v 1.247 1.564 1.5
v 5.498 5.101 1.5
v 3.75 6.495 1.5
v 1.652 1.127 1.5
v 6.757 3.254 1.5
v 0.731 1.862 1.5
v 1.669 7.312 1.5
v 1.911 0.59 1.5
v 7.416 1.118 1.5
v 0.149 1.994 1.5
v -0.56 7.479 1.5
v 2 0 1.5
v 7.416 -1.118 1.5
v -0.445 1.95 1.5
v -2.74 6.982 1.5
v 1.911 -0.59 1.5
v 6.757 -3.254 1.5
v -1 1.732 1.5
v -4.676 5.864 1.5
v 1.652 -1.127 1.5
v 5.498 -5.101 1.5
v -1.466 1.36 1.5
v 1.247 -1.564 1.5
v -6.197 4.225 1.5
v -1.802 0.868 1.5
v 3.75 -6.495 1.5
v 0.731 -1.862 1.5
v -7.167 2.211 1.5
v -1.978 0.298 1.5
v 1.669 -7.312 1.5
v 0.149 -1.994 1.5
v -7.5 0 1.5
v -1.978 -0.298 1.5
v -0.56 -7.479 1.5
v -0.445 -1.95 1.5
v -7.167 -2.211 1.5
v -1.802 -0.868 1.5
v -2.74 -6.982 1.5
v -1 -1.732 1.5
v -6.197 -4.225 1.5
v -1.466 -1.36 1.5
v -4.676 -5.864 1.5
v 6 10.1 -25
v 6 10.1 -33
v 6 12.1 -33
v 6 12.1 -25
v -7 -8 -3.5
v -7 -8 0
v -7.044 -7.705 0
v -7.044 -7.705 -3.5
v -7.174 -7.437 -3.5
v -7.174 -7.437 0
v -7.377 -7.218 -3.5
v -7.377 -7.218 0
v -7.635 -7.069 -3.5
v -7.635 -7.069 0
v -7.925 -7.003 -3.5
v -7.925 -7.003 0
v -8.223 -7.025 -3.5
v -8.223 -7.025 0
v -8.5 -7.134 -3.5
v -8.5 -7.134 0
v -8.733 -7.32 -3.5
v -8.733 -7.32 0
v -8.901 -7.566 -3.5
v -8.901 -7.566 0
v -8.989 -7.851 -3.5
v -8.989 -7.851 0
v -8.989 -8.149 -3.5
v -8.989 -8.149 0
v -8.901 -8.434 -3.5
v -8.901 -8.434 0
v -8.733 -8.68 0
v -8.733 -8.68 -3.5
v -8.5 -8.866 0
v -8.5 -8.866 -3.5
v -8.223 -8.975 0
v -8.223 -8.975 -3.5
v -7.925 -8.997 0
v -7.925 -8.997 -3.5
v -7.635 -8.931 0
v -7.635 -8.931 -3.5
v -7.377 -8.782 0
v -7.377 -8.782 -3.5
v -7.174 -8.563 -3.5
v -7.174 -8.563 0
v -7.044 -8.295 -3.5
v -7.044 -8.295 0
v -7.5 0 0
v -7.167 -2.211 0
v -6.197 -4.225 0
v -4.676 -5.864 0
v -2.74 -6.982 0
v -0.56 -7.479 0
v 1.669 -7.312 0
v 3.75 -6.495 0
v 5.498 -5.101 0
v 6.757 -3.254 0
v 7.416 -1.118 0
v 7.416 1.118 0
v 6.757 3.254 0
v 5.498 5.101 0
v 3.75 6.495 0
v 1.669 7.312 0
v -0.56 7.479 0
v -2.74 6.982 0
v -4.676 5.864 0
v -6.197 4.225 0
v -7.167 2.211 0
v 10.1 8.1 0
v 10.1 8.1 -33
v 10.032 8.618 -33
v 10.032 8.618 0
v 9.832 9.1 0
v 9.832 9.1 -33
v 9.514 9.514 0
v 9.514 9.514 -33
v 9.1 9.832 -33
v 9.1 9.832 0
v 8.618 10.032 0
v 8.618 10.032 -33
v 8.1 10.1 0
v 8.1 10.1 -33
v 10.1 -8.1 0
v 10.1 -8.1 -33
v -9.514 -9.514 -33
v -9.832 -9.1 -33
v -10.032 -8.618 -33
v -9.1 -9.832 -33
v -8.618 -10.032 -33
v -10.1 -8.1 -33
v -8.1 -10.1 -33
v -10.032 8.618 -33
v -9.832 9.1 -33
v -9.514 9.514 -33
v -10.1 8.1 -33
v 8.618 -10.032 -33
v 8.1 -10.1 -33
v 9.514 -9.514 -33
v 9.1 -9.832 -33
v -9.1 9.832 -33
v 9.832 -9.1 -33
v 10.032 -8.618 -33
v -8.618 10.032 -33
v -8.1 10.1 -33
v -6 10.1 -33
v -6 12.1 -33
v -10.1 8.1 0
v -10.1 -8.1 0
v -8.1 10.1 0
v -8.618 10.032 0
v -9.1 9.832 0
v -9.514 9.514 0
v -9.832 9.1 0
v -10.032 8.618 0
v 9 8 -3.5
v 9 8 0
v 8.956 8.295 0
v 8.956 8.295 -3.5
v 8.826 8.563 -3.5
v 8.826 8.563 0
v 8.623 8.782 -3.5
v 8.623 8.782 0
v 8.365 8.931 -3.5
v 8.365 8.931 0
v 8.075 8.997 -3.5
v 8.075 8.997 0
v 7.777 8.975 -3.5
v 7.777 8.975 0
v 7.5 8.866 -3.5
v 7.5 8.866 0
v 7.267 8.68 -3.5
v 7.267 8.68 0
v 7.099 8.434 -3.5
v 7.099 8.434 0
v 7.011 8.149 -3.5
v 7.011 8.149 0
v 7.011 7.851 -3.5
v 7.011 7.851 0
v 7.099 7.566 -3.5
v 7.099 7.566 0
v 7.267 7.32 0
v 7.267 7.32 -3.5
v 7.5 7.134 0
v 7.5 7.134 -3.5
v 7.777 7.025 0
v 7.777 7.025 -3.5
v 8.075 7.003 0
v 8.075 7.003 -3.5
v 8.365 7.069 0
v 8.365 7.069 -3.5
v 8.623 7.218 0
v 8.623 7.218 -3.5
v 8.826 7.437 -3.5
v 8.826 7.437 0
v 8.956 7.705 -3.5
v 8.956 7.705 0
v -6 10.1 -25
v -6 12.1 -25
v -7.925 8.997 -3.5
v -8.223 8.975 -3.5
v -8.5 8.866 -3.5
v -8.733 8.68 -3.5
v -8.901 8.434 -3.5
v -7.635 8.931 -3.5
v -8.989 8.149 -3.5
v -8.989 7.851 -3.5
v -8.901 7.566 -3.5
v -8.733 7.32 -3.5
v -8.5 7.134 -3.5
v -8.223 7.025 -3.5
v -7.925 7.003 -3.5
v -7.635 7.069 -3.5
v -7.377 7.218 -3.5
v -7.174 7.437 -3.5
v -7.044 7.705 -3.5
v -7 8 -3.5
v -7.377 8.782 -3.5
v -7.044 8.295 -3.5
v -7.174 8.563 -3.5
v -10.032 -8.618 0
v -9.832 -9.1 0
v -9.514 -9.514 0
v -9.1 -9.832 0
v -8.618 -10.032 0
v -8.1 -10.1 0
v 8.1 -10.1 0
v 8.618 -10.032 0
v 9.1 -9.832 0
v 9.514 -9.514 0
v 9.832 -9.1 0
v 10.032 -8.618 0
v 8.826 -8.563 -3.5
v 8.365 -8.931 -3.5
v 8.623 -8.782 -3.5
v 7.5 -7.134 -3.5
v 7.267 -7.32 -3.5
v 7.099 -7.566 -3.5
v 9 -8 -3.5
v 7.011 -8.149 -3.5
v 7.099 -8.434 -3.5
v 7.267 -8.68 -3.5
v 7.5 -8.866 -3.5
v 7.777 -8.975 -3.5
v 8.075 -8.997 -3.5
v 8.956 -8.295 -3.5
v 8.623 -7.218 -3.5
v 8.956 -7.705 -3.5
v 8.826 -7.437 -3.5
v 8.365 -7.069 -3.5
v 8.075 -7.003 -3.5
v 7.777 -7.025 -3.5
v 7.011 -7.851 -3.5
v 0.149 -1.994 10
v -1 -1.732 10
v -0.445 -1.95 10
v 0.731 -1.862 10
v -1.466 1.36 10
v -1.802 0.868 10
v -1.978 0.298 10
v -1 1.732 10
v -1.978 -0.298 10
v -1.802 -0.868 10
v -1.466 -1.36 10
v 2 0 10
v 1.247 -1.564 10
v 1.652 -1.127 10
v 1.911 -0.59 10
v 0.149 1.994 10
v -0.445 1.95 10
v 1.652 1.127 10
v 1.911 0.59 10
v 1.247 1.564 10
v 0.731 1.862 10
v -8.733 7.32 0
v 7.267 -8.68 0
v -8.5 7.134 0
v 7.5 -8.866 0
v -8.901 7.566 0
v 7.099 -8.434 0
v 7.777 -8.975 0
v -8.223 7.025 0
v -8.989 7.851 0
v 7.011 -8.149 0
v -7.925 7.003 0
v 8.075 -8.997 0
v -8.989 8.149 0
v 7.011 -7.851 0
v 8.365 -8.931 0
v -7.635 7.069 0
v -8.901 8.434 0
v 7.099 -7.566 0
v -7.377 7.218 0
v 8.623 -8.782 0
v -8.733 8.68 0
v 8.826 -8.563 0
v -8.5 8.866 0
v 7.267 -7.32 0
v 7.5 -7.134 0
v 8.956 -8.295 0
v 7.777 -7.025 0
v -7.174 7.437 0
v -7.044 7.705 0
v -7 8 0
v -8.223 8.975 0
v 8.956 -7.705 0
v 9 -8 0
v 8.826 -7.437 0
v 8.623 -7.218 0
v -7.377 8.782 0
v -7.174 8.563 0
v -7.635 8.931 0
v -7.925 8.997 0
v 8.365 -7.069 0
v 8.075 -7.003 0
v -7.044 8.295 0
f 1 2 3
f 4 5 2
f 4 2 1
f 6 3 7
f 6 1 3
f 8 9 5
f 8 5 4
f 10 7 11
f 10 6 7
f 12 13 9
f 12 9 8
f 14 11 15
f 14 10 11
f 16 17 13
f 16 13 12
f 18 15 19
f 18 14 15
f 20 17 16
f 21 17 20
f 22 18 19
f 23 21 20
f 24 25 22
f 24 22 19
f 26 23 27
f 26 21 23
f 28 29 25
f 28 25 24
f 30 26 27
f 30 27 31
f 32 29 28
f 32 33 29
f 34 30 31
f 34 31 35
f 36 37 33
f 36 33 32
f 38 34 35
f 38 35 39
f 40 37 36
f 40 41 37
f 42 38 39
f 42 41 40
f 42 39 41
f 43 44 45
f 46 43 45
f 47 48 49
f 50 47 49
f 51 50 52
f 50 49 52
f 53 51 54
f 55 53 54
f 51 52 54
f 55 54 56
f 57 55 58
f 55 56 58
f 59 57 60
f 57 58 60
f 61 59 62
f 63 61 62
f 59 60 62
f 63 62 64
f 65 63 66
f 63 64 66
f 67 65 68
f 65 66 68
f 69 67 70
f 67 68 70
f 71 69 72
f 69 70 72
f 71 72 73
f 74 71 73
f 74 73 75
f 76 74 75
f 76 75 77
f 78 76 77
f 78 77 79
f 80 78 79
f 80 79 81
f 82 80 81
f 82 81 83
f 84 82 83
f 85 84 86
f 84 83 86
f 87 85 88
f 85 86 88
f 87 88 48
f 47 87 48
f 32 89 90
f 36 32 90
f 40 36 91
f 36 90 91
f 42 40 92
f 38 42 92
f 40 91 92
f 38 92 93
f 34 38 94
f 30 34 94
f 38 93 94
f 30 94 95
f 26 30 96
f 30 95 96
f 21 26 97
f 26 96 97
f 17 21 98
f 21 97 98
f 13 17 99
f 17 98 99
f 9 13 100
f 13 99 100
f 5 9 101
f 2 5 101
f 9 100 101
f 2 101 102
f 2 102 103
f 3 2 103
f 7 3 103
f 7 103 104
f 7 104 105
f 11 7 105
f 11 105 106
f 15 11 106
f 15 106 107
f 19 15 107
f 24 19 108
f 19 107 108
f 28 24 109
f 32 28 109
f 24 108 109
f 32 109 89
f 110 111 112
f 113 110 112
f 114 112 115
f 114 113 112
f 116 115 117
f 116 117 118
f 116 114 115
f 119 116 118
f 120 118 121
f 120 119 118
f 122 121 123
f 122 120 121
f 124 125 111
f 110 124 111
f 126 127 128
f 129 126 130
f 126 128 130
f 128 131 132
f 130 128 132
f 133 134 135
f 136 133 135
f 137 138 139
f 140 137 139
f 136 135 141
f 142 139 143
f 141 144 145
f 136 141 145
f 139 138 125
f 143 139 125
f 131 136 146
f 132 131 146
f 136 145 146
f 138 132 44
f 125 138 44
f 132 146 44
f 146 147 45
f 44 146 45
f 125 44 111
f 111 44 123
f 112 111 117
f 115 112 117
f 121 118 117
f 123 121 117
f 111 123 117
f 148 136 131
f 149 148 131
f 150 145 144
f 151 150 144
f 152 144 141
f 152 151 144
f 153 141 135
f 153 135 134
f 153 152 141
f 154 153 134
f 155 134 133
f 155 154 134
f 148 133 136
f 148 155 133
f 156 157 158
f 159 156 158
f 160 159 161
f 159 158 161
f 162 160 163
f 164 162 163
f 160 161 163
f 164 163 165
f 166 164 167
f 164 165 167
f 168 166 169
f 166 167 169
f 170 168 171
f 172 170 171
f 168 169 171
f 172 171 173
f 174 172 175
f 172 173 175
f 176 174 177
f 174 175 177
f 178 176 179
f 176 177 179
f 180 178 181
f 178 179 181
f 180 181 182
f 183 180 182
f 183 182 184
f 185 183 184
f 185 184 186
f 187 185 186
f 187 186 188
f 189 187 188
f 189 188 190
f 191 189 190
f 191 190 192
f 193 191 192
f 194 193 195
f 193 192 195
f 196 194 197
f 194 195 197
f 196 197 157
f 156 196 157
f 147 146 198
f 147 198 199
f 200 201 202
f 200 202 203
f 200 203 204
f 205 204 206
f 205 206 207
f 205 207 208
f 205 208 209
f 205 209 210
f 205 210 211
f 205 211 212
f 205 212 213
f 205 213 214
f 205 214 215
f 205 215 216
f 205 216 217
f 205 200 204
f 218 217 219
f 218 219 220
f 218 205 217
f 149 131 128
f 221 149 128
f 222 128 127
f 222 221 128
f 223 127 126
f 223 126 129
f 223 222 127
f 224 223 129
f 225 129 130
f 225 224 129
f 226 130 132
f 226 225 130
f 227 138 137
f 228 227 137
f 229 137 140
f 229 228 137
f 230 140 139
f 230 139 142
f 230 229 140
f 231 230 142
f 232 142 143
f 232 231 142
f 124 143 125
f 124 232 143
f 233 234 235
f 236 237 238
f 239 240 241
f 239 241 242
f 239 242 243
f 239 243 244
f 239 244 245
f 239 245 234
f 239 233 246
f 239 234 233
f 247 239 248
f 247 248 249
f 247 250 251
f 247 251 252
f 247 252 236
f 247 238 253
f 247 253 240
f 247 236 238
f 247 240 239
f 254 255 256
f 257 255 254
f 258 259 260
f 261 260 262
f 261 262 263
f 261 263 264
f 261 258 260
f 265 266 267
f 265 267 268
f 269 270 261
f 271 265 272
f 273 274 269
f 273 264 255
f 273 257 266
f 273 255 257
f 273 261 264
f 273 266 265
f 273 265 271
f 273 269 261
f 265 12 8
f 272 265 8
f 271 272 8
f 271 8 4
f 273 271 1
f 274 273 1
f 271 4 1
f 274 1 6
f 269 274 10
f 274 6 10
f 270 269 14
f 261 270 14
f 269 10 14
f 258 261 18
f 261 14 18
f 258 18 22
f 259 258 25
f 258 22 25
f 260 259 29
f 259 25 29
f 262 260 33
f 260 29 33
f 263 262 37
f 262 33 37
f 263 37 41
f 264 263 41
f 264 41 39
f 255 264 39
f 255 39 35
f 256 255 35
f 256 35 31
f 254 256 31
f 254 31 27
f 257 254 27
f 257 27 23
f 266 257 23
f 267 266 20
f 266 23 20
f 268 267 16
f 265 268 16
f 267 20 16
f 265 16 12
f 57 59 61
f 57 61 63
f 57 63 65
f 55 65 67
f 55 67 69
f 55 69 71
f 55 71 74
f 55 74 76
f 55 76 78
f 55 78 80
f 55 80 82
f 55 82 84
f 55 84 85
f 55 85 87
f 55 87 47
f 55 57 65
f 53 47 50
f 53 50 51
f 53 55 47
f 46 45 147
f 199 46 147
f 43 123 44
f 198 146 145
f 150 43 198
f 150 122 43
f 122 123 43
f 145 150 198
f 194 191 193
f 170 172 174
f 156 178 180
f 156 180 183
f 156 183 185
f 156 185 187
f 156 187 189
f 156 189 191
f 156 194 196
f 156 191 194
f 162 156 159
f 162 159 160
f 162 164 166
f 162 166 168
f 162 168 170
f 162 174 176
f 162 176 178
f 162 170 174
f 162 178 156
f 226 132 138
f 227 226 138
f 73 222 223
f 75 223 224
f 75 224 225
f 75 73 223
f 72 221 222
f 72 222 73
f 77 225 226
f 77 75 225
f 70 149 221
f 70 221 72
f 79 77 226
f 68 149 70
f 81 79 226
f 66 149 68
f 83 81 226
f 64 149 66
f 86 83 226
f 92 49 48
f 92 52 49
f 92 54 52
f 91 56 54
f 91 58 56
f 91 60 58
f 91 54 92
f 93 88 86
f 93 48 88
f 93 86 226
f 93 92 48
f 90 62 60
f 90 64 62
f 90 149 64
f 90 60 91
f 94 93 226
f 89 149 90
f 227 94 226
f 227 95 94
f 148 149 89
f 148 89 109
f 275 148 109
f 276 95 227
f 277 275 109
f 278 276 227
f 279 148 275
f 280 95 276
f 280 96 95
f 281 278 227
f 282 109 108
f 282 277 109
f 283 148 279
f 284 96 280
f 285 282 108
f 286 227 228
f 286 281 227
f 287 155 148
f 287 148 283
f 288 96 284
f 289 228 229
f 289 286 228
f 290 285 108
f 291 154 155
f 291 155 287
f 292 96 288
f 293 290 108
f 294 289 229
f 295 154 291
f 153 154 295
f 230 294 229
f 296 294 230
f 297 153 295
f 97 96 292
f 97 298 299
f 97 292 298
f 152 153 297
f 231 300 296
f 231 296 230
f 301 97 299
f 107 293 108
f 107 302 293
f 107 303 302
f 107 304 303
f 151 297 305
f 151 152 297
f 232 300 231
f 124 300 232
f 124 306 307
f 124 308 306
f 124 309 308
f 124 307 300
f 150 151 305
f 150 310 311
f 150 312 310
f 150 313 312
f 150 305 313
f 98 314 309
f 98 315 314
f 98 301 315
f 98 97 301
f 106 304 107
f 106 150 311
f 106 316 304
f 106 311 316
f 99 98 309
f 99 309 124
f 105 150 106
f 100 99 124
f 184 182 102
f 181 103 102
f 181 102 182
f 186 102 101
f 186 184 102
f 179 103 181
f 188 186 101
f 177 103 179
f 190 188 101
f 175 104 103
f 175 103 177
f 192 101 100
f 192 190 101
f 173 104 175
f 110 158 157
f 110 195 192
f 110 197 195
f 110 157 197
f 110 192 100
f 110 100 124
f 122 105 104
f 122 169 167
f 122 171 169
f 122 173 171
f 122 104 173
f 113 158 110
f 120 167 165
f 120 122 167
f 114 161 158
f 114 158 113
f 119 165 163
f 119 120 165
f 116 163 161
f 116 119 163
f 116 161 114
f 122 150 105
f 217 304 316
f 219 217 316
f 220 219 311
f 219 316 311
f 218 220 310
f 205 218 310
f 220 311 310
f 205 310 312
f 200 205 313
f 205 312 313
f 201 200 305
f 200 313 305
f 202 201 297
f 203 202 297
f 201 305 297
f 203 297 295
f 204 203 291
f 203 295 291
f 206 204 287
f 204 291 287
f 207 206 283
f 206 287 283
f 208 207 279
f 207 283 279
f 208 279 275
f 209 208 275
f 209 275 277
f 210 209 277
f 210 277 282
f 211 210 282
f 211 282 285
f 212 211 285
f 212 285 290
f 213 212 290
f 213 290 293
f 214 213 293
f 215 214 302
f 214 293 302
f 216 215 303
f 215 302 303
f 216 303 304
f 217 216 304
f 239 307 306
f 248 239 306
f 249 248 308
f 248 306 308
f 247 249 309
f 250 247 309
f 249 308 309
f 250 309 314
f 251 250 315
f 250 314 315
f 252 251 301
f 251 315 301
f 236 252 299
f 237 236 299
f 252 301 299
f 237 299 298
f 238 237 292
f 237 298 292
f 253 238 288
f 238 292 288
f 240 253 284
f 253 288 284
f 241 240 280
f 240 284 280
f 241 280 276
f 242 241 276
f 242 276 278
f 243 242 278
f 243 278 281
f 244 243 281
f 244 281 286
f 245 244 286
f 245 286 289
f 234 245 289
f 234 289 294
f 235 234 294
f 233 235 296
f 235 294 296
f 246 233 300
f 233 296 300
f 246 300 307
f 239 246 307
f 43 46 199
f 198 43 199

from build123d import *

# Parameters (mm, degrees)
BOSS_EXTRUDE1_DEPTH = 33
SKETCH2_R           = 1
CUT_EXTRUDE1_DEPTH  = 3.5
SKETCH3_W           = 12
SKETCH3_H           = 2
BOSS_EXTRUDE2_DEPTH = 8
SKETCH4_R           = 7.5
BOSS_EXTRUDE3_DEPTH = 1.5
SKETCH5_R           = 2
BOSS_EXTRUDE4_DEPTH = 8.5


with BuildPart() as part:
    # Sketch1 → Boss-Extrude1 (new body)
    with BuildSketch(Plane.XY):
        with BuildLine():
            Line((-8.1, -10.1), (8.1, -10.1))
            ThreePointArc((8.1, -10.1), (9.514213562, -9.514213562), (10.1, -8.1))
            Line((10.1, -8.1), (10.1, 8.1))
            ThreePointArc((10.1, 8.1), (9.514213562, 9.514213562), (8.1, 10.1))
            Line((8.1, 10.1), (-8.1, 10.1))
            ThreePointArc((-8.1, 10.1), (-9.514213562, 9.514213562), (-10.1, 8.1))
            Line((-10.1, 8.1), (-10.1, -8.1))
            ThreePointArc((-10.1, -8.1), (-9.514213562, -9.514213562), (-8.1, -10.1))
        make_face()
    extrude(amount=-BOSS_EXTRUDE1_DEPTH)

    # Sketch2 → Cut-Extrude1 (cut)
    with BuildSketch(Plane.XY):
        with Locations((-8, 8)):
            Circle(SKETCH2_R)
        with Locations((8, 8)):
            Circle(SKETCH2_R)
        with Locations((8, -8)):
            Circle(SKETCH2_R)
        with Locations((-8, -8)):
            Circle(SKETCH2_R)
    extrude(amount=-CUT_EXTRUDE1_DEPTH, mode=Mode.SUBTRACT)

    # Sketch3 → Boss-Extrude2 (add)
    with BuildSketch(Plane(origin=(0, 0, -33), x_dir=(-1, 0, 0), z_dir=(0, 0, -1))):
        with Locations((0, 11.1)):
            Rectangle(SKETCH3_W, SKETCH3_H)
    extrude(amount=-BOSS_EXTRUDE2_DEPTH)

    # Sketch4 → Boss-Extrude3 (add)
    with BuildSketch(Plane.XY):
        with Locations(Location((0, 0, 0), (0, 0, 180))):
            Circle(SKETCH4_R)
    extrude(amount=BOSS_EXTRUDE3_DEPTH)

    # Sketch5 → Boss-Extrude4 (add)
    with BuildSketch(Plane.XY.offset(1.5)):
        Circle(SKETCH5_R)
    extrude(amount=BOSS_EXTRUDE4_DEPTH)


solid = part.part
